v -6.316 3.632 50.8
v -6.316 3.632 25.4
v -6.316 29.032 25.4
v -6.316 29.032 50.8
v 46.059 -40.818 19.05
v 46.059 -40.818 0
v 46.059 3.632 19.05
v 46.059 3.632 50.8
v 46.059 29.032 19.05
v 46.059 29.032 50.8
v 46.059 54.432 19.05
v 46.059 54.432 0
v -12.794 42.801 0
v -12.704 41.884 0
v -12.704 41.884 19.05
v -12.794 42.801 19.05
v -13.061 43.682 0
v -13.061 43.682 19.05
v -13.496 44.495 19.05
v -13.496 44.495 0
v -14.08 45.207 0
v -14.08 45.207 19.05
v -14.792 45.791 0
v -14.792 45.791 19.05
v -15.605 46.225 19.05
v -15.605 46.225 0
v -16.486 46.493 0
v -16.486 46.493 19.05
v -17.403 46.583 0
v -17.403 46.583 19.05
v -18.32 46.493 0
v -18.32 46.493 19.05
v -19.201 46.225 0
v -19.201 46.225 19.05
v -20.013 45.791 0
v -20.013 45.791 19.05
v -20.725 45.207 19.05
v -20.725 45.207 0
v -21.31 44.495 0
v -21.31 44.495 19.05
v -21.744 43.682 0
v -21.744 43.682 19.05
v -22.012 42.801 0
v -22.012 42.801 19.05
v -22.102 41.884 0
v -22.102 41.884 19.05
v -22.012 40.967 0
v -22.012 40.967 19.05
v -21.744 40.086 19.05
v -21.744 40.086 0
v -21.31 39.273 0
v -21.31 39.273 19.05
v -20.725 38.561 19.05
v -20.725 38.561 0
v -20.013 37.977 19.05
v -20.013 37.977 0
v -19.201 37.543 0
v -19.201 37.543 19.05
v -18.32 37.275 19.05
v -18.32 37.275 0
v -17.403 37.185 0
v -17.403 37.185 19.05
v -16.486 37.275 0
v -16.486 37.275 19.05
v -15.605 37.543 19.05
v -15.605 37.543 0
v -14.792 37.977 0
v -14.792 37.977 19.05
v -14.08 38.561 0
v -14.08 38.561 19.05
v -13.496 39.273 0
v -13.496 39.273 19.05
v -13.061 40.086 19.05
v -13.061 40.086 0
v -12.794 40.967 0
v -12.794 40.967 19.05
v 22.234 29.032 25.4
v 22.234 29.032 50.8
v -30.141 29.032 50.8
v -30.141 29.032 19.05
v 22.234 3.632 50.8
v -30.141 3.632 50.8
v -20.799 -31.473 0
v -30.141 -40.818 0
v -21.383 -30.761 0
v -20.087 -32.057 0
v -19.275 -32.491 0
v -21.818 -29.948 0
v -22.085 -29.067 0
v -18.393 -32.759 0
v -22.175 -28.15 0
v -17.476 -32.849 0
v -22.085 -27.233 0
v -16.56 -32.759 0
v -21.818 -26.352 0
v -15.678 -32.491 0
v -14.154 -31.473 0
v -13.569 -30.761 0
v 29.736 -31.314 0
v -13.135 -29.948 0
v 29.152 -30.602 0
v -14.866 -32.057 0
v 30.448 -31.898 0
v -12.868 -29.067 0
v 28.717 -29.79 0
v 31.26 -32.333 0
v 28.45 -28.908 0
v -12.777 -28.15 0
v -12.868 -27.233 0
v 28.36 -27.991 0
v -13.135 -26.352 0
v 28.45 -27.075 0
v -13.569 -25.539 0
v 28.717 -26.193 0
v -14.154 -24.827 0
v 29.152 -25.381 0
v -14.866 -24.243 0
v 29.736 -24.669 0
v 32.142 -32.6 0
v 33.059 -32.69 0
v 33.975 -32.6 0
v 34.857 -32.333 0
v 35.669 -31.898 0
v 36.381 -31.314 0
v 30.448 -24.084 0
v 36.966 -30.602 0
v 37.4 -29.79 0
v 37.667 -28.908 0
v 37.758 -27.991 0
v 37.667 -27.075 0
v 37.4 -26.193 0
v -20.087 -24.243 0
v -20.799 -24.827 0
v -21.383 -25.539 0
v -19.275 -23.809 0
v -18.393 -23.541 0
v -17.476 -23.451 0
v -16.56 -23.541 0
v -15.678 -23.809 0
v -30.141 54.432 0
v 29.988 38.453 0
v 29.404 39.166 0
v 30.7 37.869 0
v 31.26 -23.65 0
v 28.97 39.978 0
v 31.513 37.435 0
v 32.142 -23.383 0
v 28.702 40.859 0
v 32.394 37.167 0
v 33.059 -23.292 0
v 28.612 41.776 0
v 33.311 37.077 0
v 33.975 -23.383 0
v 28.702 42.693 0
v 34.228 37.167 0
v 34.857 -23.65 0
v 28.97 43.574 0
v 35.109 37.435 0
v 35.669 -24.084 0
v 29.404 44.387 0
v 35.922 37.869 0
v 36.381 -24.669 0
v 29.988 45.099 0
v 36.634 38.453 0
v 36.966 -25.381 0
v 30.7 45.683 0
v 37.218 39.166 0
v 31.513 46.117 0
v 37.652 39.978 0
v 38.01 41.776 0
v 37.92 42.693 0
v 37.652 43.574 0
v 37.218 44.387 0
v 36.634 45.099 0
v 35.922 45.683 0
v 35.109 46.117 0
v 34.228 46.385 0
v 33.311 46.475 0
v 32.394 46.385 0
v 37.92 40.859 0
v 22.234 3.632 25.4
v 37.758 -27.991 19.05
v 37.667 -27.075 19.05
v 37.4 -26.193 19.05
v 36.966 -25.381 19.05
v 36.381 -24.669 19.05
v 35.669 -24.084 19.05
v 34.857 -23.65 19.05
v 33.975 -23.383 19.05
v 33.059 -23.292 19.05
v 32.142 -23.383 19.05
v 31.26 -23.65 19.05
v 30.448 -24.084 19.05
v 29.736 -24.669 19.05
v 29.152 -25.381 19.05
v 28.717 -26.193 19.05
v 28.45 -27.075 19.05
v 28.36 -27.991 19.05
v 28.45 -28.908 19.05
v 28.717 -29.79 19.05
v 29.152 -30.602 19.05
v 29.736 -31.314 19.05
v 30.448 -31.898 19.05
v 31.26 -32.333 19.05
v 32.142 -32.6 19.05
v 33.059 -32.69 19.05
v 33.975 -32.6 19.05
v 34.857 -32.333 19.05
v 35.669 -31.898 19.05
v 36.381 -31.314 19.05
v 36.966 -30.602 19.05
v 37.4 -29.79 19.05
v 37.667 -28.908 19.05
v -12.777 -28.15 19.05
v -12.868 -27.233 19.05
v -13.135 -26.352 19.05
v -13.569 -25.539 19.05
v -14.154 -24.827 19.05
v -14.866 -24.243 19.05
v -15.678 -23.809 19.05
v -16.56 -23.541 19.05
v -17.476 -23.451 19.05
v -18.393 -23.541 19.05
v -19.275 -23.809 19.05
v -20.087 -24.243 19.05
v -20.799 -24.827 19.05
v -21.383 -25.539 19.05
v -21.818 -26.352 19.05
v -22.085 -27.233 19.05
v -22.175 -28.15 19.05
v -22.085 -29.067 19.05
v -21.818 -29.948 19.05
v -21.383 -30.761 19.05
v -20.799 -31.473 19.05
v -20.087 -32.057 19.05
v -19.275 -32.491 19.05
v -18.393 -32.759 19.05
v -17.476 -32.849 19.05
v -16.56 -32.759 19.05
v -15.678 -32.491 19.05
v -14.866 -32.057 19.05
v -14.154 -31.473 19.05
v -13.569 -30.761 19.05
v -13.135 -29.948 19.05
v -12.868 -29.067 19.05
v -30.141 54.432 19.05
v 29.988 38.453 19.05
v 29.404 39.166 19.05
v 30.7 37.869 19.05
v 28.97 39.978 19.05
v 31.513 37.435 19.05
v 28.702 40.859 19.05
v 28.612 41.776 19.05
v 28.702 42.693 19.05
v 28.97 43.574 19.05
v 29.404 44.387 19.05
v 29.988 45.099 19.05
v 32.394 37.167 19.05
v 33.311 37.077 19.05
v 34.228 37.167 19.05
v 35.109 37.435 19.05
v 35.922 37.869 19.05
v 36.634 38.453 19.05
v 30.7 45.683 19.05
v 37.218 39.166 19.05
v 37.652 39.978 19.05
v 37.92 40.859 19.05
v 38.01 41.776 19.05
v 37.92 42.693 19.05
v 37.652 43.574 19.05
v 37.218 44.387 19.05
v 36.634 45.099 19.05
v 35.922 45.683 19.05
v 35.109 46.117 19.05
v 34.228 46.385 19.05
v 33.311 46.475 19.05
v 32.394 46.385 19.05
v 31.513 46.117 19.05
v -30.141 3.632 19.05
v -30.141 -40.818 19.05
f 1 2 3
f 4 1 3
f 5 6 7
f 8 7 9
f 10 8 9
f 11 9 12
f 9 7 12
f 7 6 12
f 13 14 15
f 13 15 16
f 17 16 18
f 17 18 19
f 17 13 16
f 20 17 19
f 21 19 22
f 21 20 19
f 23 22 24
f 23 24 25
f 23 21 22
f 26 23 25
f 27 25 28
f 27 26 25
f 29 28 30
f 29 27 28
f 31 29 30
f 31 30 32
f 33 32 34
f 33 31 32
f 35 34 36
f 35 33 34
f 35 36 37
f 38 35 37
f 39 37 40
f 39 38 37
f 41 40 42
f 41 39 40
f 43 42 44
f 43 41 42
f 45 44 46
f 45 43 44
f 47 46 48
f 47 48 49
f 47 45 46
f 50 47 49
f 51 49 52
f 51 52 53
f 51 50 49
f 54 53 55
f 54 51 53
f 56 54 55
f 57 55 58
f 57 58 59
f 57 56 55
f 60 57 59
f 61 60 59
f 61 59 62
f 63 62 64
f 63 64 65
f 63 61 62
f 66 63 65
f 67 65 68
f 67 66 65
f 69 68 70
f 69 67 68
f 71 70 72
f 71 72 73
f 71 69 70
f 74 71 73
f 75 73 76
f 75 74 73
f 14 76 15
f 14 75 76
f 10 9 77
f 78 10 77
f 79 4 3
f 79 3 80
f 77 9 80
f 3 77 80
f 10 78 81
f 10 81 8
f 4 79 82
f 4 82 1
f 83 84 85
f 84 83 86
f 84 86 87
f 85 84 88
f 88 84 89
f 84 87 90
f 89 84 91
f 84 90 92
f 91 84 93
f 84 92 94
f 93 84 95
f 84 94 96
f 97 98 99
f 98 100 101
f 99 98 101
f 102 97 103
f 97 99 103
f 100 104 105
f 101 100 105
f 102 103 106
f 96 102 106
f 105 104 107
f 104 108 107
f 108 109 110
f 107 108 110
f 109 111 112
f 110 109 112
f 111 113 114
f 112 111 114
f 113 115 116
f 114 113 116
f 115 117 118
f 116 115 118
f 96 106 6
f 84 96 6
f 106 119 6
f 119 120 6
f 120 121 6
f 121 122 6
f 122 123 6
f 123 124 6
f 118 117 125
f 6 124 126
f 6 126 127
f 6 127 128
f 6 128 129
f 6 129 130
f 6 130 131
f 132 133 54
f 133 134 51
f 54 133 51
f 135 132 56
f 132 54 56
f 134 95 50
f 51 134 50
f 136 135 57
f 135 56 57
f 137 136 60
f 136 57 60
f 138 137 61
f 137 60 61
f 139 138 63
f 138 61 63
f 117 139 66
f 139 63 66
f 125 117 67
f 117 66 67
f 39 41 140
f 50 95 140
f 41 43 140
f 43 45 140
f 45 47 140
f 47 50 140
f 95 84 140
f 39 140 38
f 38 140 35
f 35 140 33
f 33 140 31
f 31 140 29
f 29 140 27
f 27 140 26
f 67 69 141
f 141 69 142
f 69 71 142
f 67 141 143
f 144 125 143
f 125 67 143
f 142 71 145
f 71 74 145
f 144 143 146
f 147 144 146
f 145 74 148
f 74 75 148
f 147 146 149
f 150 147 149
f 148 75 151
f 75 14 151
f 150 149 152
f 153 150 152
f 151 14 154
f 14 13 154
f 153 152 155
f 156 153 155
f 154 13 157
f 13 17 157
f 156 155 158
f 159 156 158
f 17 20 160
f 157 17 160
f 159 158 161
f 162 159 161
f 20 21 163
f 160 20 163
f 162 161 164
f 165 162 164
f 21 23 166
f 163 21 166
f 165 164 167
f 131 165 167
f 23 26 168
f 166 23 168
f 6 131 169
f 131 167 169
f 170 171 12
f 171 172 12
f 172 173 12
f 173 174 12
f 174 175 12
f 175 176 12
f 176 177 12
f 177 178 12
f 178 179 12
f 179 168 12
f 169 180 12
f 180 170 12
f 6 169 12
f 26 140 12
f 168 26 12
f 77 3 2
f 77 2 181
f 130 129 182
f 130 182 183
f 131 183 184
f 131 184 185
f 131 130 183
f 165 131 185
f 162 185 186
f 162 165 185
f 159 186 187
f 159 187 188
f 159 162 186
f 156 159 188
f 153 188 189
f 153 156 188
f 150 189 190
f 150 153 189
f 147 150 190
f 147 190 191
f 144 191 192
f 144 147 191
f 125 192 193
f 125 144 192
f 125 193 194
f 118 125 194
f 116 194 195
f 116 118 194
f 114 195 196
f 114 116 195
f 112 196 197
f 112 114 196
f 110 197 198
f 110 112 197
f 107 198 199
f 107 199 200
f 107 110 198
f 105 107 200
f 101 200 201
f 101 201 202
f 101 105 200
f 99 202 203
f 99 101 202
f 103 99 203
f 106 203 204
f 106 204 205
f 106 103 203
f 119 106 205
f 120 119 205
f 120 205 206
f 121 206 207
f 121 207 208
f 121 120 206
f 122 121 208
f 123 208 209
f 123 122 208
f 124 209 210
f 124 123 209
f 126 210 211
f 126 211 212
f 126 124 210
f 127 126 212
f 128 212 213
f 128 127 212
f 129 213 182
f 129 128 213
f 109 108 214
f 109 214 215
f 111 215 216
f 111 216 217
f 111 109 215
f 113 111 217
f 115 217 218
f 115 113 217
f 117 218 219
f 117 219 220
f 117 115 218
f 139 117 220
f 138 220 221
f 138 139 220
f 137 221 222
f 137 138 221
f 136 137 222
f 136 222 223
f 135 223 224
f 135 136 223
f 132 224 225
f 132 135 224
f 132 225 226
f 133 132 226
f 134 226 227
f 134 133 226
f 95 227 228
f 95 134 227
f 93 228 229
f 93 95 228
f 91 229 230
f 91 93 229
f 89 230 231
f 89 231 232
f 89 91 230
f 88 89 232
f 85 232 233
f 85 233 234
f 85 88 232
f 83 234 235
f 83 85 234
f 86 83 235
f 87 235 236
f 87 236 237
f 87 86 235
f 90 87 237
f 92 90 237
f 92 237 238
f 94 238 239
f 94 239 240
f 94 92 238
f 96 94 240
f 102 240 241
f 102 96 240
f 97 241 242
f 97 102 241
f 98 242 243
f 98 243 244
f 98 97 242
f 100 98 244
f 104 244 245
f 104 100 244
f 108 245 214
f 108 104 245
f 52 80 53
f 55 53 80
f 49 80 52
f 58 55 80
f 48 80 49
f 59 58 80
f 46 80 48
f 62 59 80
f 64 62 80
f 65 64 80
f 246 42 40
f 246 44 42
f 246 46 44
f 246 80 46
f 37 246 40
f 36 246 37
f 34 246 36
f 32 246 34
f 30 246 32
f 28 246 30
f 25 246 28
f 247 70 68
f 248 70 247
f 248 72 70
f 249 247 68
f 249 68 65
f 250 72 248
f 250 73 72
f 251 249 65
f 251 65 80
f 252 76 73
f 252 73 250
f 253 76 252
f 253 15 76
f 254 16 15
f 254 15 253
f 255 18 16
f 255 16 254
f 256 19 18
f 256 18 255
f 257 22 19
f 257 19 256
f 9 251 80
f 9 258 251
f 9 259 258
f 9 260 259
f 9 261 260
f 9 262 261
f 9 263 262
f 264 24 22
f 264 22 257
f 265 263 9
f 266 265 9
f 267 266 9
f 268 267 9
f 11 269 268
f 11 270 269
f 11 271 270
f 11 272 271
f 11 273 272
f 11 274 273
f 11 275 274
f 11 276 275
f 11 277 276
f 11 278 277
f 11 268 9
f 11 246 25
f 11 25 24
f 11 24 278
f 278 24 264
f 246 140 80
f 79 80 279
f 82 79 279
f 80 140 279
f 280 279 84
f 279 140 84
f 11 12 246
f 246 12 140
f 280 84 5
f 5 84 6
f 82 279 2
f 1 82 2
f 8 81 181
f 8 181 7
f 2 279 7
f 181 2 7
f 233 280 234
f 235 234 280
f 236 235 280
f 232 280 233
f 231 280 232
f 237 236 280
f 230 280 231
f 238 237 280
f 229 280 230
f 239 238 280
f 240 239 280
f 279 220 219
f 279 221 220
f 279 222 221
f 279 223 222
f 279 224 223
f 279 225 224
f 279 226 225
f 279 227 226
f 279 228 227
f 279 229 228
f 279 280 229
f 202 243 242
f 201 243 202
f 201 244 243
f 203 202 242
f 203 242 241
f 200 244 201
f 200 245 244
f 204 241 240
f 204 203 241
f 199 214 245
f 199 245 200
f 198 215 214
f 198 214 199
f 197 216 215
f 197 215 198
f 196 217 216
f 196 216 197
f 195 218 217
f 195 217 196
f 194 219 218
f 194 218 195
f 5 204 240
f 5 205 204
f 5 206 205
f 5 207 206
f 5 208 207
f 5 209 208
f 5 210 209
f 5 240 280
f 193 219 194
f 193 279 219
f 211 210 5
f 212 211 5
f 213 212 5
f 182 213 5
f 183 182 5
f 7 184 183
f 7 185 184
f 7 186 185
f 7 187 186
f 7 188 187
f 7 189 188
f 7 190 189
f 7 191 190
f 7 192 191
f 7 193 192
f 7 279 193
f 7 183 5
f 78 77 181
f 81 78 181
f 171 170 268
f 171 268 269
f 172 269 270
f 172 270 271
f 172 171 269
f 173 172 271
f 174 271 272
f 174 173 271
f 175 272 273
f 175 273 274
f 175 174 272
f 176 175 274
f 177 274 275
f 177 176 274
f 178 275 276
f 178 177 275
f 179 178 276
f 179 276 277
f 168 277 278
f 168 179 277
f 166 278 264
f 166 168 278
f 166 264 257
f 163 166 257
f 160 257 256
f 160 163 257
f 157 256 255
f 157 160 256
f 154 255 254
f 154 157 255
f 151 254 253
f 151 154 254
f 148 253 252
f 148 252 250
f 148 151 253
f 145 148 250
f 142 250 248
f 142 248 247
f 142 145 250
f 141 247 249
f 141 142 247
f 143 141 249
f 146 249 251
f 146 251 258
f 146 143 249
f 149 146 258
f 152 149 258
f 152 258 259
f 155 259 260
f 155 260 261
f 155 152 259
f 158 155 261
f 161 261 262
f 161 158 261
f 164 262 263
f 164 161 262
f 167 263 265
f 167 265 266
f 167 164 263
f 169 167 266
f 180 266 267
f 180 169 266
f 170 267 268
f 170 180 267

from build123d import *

# Parameters (mm, degrees)
F0_R     = 4.699
F1_DEPTH = 19.05
F2_DEPTH = 50.8
F3_DEPTH = 25.4


# Not quite as in the source:
# - a feature of the source that left no trace in its solid (it failed there, or was rolled back) is left out


with BuildPart() as f1:
    # F0 (on Top) → F1 (new body)
    with BuildSketch(Plane.XY):
        Polygon((46.0592823896, 54.4316620976), (-30.1407176104, 54.4316620976), (-30.1407176104, 29.0316620976), (-6.3155176104, 29.0316620976), (22.2340823896, 29.0316620976), (46.0592823896, 29.0316620976), align=None)
        with Locations((-17.4028014716, 41.883985333)):
            Circle(F0_R, mode=Mode.SUBTRACT)
        with Locations((33.3109036978, 41.7761531395)):
            Circle(F0_R, mode=Mode.SUBTRACT)
        Polygon((-6.3155176104, 29.0316620976), (-30.1407176104, 29.0316620976), (-30.1407176104, 3.6316620976), (-6.3155176104, 3.6316620976), (-6.3155176104, 16.6544260591), align=None)
        Polygon((-6.3155176104, 3.6316620976), (-30.1407176104, 3.6316620976), (-30.1407176104, -27.9789566994), (-30.1407176104, -40.8183379024), (-23.7907176104, -40.8183379024), (-17.4407176104, -40.8183379024), (33.3592823896, -40.8183379024), (46.0592823896, -40.8183379024), (46.0592823896, -28.1183379024), (46.0592823896, 3.6316620976), (22.2340823896, 3.6316620976), align=None)
        with Locations((-17.4763201279, -28.1499404974)):
            Circle(F0_R, mode=Mode.SUBTRACT)
        with Locations((33.0586231201, -27.9913925288)):
            Circle(F0_R, mode=Mode.SUBTRACT)
        Polygon((46.0592823896, 3.6316620976), (46.0592823896, 29.0316620976), (22.2340823896, 29.0316620976), (22.2340823896, 18.1238111109), (22.2340823896, 3.6316620976), align=None)
    extrude(amount=F1_DEPTH)

    # F0 (on Top) → F2 (join)
    with BuildSketch(Plane.XY):
        Polygon((-6.3155176104, 29.0316620976), (-30.1407176104, 29.0316620976), (-30.1407176104, 3.6316620976), (-6.3155176104, 3.6316620976), (-6.3155176104, 16.6544260591), align=None)
        Polygon((46.0592823896, 3.6316620976), (46.0592823896, 29.0316620976), (22.2340823896, 29.0316620976), (22.2340823896, 18.1238111109), (22.2340823896, 3.6316620976), align=None)
    extrude(amount=F2_DEPTH)

    # F0 (on Top) → F3 (join)
    with BuildSketch(Plane.XY):
        Polygon((22.2340823896, 29.0316620976), (-6.3155176104, 29.0316620976), (-6.3155176104, 16.6544260591), (-6.3155176104, 3.6316620976), (22.2340823896, 3.6316620976), (22.2340823896, 18.1238111109), align=None)
    extrude(amount=F3_DEPTH)


solid = f1.part
